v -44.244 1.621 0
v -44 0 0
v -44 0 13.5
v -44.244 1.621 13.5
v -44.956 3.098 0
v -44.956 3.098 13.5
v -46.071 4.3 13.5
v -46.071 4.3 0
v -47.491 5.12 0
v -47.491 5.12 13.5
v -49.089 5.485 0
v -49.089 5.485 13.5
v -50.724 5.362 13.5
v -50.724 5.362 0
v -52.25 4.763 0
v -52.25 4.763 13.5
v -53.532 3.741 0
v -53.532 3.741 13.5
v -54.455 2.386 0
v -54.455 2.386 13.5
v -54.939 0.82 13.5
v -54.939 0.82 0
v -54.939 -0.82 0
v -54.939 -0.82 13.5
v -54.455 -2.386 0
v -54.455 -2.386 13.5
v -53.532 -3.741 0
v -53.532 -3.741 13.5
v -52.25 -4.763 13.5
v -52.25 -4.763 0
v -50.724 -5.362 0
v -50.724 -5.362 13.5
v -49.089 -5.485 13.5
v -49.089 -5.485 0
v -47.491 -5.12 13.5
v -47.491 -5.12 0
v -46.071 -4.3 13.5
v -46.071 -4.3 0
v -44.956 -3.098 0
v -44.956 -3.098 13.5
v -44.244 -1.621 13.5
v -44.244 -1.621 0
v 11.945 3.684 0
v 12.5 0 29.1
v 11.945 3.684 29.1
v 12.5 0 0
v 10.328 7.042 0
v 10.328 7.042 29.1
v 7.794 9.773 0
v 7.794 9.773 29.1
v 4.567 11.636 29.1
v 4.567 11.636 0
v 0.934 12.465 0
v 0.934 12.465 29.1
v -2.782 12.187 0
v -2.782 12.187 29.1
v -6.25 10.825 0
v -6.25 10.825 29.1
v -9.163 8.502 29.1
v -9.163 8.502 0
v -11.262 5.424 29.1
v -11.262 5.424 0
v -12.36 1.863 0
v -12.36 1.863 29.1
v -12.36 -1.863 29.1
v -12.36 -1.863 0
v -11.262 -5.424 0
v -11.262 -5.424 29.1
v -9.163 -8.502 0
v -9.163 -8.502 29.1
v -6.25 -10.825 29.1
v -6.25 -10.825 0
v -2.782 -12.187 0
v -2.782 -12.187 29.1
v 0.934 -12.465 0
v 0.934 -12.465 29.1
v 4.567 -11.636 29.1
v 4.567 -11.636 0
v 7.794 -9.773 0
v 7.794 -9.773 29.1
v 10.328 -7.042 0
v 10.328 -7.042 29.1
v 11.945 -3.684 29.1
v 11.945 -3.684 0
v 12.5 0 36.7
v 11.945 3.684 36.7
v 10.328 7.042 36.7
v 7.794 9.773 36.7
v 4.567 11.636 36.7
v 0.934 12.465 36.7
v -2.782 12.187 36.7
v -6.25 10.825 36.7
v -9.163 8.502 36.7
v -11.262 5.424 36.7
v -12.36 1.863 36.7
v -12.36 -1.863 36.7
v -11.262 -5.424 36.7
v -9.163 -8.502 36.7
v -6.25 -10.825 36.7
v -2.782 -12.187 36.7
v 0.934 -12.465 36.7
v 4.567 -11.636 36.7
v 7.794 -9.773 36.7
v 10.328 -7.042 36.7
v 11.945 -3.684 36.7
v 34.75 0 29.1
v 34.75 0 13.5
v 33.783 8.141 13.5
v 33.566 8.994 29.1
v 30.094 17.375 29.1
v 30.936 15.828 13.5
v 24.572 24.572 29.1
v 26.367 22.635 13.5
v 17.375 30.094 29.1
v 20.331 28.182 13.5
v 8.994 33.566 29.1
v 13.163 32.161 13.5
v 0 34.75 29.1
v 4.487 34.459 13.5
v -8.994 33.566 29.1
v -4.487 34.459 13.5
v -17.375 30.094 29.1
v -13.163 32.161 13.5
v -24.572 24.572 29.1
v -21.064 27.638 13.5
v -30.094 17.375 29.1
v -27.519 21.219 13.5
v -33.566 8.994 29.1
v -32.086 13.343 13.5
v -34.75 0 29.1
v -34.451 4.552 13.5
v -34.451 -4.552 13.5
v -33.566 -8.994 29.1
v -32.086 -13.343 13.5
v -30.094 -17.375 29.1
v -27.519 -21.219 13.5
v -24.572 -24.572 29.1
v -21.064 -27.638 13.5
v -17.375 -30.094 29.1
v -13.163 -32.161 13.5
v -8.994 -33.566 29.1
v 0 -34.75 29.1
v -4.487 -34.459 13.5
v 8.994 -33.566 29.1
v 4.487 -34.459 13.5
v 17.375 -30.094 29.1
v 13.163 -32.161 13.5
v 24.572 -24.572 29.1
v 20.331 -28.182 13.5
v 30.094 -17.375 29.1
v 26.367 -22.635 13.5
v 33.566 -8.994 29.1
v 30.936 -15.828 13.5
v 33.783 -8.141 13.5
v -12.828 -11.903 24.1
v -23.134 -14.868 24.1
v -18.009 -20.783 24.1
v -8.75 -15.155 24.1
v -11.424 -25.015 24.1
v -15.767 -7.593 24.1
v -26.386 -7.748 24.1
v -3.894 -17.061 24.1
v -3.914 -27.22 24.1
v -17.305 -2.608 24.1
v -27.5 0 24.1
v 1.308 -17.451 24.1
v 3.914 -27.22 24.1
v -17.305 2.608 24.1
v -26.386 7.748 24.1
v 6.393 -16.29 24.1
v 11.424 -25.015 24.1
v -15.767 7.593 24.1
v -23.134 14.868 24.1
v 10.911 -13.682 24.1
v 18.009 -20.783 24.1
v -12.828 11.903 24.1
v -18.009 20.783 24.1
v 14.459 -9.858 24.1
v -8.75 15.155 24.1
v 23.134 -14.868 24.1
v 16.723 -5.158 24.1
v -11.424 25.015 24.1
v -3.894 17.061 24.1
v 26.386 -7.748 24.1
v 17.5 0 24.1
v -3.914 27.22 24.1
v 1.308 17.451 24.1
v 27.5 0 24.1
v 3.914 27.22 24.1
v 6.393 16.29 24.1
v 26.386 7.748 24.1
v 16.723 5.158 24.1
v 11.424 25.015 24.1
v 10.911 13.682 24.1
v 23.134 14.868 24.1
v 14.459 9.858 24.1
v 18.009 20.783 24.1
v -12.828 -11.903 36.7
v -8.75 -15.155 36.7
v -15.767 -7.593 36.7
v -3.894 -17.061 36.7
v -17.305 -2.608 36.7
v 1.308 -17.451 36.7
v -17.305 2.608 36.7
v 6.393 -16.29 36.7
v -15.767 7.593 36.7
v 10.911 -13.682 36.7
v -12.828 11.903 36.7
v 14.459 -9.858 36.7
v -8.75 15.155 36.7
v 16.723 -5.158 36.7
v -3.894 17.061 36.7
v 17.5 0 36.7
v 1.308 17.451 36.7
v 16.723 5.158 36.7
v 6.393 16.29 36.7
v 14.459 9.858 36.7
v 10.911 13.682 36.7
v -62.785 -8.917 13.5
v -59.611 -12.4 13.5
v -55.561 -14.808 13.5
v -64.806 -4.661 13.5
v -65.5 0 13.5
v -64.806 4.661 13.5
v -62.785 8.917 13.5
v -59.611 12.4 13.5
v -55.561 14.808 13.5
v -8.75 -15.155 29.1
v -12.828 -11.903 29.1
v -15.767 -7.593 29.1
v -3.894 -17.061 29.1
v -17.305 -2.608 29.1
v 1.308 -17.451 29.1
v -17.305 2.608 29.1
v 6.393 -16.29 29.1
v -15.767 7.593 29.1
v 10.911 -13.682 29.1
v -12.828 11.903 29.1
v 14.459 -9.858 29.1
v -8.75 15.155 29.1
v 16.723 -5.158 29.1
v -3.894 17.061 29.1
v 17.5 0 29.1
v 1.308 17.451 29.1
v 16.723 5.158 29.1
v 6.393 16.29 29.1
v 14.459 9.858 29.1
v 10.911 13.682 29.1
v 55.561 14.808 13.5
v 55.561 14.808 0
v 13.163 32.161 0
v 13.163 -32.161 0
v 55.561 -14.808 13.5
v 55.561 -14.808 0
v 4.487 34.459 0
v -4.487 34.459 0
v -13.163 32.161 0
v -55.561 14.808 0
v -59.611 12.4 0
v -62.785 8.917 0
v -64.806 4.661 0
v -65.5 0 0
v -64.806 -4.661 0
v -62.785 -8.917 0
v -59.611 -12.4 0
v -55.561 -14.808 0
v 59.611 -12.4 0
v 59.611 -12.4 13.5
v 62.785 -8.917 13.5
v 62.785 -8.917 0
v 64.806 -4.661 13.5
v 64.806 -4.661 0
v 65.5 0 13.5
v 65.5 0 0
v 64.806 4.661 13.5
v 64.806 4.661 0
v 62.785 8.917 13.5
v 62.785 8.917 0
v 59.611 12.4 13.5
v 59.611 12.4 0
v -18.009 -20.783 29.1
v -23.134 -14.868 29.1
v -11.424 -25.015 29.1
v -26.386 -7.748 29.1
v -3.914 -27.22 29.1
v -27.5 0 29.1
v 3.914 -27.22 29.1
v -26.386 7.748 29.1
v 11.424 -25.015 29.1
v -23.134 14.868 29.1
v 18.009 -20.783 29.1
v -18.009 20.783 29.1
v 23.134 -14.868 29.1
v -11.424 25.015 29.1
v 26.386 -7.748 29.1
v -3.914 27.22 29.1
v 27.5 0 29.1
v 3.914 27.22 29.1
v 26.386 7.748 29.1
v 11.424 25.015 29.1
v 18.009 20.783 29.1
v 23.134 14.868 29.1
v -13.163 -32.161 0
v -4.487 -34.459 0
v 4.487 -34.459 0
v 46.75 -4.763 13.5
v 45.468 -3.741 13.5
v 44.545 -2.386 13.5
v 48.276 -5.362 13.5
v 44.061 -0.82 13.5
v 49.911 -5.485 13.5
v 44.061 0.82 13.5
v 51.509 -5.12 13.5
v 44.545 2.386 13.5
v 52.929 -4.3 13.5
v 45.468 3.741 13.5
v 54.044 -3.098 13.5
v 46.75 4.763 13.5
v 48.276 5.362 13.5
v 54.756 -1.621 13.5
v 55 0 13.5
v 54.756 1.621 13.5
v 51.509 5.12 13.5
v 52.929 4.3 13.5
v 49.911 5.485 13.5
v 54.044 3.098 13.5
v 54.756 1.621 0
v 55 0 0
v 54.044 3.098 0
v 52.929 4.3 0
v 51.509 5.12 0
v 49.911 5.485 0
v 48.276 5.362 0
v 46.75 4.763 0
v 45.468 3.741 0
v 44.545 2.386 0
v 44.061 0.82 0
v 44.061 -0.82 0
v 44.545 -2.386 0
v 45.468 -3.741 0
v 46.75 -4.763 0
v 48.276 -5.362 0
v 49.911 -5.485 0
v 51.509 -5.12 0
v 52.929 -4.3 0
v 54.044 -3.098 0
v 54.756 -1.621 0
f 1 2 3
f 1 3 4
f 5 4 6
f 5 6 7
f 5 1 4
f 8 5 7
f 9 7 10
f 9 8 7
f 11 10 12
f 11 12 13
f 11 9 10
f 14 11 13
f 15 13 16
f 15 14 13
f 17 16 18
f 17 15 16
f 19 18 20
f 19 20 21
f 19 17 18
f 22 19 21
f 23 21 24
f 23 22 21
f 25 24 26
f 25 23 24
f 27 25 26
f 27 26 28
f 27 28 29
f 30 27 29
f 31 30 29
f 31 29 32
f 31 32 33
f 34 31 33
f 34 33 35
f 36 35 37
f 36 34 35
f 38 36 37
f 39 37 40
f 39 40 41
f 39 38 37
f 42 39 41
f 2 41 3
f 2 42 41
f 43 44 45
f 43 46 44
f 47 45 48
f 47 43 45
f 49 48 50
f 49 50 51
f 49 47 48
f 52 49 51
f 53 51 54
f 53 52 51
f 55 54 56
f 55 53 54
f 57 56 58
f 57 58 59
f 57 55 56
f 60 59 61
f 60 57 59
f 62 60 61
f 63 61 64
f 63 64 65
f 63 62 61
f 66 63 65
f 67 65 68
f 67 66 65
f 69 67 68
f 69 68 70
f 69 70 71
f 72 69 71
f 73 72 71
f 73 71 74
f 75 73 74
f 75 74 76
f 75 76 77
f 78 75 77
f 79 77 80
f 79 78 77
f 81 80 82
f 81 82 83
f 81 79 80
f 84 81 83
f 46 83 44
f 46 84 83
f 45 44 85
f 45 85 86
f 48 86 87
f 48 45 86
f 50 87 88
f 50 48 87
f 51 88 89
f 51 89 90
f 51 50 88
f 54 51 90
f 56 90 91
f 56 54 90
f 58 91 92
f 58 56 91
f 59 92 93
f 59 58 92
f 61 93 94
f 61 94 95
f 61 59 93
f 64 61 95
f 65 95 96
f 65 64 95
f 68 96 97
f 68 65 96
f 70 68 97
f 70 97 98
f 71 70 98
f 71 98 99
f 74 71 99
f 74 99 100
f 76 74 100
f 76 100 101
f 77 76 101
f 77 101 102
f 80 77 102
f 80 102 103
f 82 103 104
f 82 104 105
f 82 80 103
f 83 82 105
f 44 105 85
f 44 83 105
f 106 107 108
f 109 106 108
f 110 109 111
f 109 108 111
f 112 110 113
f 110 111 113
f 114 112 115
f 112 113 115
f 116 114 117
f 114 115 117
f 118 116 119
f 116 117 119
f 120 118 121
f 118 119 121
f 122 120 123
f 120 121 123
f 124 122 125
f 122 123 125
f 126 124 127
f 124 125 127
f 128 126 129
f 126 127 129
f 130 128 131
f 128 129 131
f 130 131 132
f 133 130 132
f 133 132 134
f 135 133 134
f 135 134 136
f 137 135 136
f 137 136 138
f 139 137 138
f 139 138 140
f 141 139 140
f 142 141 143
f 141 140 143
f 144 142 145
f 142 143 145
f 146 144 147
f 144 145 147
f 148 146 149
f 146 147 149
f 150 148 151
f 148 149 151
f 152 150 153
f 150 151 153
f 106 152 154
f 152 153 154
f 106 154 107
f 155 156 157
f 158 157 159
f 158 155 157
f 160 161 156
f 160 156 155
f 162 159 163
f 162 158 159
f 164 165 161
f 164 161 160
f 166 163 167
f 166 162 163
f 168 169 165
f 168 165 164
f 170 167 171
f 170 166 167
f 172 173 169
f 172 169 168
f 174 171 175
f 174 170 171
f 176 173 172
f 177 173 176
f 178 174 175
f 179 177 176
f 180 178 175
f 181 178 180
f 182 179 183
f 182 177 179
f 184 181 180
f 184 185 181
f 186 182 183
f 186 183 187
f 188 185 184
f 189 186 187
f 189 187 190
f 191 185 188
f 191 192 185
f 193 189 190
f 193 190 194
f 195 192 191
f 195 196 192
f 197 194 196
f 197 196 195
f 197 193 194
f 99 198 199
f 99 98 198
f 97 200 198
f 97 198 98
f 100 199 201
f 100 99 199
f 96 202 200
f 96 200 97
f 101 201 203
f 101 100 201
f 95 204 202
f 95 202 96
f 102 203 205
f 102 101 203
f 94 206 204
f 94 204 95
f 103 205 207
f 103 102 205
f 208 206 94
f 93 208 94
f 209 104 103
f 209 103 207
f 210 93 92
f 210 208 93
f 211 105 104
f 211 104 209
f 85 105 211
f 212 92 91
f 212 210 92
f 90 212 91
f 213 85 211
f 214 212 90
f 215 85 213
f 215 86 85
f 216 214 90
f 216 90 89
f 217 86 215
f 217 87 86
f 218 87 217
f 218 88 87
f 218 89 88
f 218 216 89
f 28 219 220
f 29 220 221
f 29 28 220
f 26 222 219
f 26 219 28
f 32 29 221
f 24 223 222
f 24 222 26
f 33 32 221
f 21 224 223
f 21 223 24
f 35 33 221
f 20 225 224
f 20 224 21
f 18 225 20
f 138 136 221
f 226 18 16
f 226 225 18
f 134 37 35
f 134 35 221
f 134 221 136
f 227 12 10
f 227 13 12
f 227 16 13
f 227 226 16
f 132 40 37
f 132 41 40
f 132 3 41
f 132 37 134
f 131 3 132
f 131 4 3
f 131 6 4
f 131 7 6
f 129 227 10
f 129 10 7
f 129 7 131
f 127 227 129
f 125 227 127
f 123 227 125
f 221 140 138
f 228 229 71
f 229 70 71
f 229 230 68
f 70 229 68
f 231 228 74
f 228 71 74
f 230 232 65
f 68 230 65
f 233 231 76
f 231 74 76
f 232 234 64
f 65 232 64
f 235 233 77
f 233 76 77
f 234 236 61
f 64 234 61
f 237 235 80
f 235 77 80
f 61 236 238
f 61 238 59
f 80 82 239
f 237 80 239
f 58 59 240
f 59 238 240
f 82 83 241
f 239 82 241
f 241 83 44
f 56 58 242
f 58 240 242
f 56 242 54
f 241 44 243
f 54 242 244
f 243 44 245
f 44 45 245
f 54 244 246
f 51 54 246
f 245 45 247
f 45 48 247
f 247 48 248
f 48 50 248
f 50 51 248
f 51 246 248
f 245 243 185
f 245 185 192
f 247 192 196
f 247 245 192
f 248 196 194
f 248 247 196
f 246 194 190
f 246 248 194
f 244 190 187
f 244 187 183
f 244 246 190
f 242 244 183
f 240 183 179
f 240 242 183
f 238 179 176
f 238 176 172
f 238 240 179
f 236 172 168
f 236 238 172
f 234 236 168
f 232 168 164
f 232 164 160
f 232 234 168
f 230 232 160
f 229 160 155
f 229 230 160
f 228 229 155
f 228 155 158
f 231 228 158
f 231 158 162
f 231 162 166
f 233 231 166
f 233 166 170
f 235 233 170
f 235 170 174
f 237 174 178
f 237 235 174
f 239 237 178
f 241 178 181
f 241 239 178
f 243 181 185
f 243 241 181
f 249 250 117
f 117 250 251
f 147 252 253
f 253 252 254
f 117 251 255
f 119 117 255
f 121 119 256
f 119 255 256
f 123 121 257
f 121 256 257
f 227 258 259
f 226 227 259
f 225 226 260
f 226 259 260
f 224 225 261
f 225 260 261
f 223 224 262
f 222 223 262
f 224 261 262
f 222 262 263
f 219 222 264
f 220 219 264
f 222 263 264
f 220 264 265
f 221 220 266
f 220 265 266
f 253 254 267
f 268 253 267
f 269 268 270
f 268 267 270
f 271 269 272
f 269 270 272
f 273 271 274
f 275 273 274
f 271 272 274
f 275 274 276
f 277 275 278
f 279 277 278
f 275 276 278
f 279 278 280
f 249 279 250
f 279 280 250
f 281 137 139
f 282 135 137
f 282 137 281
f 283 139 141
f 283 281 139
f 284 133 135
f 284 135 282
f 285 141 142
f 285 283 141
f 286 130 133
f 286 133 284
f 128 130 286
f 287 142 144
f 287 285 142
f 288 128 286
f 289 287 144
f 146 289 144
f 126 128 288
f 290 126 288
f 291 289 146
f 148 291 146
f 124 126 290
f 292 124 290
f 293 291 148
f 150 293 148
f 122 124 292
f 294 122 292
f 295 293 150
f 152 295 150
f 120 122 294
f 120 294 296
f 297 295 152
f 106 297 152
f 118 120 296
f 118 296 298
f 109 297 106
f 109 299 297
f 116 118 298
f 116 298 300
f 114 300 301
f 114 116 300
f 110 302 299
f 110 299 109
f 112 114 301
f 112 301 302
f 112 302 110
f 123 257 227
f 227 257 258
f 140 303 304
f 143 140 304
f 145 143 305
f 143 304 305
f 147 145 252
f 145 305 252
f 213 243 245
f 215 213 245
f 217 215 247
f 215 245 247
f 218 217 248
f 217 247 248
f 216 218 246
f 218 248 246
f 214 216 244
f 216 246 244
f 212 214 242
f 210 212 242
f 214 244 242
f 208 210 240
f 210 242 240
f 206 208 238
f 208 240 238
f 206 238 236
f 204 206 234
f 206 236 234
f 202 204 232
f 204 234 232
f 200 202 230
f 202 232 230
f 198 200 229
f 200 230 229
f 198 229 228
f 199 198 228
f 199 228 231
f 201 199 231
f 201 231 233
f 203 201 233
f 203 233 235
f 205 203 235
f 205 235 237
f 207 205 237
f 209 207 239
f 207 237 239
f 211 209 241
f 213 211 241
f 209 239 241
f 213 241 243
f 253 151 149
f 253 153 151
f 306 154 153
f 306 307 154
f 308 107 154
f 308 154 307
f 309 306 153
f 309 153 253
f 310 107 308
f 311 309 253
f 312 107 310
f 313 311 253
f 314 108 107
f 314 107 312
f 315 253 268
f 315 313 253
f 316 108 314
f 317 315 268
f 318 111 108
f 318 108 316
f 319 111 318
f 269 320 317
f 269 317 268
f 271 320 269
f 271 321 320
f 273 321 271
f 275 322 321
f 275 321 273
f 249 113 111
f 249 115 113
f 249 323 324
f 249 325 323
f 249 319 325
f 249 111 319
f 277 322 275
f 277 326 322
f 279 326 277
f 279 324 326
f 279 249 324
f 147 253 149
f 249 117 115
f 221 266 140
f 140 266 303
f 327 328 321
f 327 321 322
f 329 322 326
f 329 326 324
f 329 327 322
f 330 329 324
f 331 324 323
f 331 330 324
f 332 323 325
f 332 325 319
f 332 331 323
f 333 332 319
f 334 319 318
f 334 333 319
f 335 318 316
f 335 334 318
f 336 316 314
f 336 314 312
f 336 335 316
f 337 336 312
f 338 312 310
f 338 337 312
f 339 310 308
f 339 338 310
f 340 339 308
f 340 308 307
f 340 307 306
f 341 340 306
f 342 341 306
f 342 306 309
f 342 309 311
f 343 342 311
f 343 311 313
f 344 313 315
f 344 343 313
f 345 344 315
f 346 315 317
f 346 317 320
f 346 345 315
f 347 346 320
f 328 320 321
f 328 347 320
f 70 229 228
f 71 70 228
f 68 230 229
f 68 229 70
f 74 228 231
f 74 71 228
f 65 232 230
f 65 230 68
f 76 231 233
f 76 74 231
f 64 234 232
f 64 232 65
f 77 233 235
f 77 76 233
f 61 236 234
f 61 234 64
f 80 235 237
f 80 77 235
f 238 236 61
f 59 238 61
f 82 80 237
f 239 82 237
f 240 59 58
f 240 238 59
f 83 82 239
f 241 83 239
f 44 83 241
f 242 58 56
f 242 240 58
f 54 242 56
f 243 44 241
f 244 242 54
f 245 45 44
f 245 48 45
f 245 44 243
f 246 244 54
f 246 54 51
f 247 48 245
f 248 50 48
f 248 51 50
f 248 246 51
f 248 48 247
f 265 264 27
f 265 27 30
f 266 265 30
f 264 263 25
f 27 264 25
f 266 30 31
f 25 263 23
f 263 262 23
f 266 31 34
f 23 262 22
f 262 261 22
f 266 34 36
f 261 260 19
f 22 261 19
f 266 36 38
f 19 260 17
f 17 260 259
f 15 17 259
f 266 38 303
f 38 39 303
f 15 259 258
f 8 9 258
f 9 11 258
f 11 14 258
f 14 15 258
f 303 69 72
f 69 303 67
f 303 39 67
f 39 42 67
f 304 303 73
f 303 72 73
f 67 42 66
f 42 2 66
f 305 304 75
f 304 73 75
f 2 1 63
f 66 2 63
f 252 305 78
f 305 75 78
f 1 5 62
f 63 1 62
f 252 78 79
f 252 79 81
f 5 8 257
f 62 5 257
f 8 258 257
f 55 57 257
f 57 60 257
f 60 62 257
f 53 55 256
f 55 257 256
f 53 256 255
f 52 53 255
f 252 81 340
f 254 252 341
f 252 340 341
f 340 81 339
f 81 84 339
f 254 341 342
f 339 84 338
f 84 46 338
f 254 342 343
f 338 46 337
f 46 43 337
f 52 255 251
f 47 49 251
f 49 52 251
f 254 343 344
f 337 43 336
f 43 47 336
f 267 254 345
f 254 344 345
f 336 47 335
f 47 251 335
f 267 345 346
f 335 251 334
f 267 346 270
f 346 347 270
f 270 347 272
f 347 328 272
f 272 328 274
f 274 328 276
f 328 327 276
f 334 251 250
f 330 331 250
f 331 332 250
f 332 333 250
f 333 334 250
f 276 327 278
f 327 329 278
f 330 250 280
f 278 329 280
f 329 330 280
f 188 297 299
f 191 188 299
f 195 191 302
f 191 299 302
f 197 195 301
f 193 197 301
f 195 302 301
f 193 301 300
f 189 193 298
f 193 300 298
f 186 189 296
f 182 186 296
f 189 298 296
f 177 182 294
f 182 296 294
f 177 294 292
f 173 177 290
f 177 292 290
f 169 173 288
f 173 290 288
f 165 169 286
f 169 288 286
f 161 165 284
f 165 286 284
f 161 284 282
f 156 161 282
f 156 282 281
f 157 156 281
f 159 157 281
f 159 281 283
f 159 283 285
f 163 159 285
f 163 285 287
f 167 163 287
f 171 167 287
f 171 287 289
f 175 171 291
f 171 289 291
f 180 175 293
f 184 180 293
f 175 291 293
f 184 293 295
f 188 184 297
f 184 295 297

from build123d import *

# Parameters (mm, degrees)
F0_R     = 12.5
F0_R_2   = 5.5
F1_DEPTH = 13.5
F2_R     = 34.75
F2_R_2   = 12.5
F3_DEPTH = 15.6
F4_R     = 17.5
F4_R_2   = 12.5
F5_DEPTH = 7.6
F6_R     = 27.5
F6_R_2   = 17.5
F7_DEPTH = 5


with BuildPart() as f1:
    # F0 (on Top) → F1 (new body)
    with BuildSketch(Plane.XY):
        with BuildLine():
            ThreePointArc((13.162879, -32.160552), (28.852838, -19.366885), (34.75, 0))
            ThreePointArc((34.75, 0), (28.852838, 19.366885), (13.162879, 32.160552))
            ThreePointArc((13.162879, 32.160552), (0, 34.75), (-13.162879, 32.160552))
            ThreePointArc((-13.162879, 32.160552), (-34.75, 0), (-13.162879, -32.160552))
            ThreePointArc((-13.162879, -32.160552), (0, -34.75), (13.162879, -32.160552))
        make_face()
        Circle(F0_R, mode=Mode.SUBTRACT)
        with BuildLine():
            ThreePointArc((13.162879, 32.160552), (28.852838, 19.366885), (34.75, 0))
            ThreePointArc((34.75, 0), (28.852838, -19.366885), (13.162879, -32.160552))
            Line((13.162879, -32.160552), (55.560606, -14.807736))
            ThreePointArc((55.560606, -14.807736), (65.5, 0), (55.560606, 14.807736))
            Line((55.560606, 14.807736), (13.162879, 32.160552))
        make_face()
        with Locations((49.5, 0)):
            Circle(F0_R_2, mode=Mode.SUBTRACT)
        with BuildLine():
            ThreePointArc((-13.162879, -32.160552), (-34.75, 0), (-13.162879, 32.160552))
            Line((-13.162879, 32.160552), (-55.560606, 14.807736))
            ThreePointArc((-55.560606, 14.807736), (-65.5, 0), (-55.560606, -14.807736))
            Line((-55.560606, -14.807736), (-13.162879, -32.160552))
        make_face()
        with Locations((-49.5, 0)):
            Circle(F0_R_2, mode=Mode.SUBTRACT)
    extrude(amount=F1_DEPTH)

    # F2 (on face) → F3 (join)
    with BuildSketch(Plane.XY.offset(13.5)):
        Circle(F2_R)
        Circle(F2_R_2, mode=Mode.SUBTRACT)
    extrude(amount=F3_DEPTH)

    # F6 (on face) → F7 (cut)
    with BuildSketch(Plane.XY.offset(29.1)):
        Circle(F6_R)
        Circle(F6_R_2, mode=Mode.SUBTRACT)
    extrude(amount=-F7_DEPTH, mode=Mode.SUBTRACT)


with BuildPart() as f5:
    # F4 (on face) → F5 (new body)
    with BuildSketch(Plane.XY.offset(29.1)):
        Circle(F4_R)
        Circle(F4_R_2, mode=Mode.SUBTRACT)
    extrude(amount=F5_DEPTH)


solid = Compound([f1.part, f5.part])
